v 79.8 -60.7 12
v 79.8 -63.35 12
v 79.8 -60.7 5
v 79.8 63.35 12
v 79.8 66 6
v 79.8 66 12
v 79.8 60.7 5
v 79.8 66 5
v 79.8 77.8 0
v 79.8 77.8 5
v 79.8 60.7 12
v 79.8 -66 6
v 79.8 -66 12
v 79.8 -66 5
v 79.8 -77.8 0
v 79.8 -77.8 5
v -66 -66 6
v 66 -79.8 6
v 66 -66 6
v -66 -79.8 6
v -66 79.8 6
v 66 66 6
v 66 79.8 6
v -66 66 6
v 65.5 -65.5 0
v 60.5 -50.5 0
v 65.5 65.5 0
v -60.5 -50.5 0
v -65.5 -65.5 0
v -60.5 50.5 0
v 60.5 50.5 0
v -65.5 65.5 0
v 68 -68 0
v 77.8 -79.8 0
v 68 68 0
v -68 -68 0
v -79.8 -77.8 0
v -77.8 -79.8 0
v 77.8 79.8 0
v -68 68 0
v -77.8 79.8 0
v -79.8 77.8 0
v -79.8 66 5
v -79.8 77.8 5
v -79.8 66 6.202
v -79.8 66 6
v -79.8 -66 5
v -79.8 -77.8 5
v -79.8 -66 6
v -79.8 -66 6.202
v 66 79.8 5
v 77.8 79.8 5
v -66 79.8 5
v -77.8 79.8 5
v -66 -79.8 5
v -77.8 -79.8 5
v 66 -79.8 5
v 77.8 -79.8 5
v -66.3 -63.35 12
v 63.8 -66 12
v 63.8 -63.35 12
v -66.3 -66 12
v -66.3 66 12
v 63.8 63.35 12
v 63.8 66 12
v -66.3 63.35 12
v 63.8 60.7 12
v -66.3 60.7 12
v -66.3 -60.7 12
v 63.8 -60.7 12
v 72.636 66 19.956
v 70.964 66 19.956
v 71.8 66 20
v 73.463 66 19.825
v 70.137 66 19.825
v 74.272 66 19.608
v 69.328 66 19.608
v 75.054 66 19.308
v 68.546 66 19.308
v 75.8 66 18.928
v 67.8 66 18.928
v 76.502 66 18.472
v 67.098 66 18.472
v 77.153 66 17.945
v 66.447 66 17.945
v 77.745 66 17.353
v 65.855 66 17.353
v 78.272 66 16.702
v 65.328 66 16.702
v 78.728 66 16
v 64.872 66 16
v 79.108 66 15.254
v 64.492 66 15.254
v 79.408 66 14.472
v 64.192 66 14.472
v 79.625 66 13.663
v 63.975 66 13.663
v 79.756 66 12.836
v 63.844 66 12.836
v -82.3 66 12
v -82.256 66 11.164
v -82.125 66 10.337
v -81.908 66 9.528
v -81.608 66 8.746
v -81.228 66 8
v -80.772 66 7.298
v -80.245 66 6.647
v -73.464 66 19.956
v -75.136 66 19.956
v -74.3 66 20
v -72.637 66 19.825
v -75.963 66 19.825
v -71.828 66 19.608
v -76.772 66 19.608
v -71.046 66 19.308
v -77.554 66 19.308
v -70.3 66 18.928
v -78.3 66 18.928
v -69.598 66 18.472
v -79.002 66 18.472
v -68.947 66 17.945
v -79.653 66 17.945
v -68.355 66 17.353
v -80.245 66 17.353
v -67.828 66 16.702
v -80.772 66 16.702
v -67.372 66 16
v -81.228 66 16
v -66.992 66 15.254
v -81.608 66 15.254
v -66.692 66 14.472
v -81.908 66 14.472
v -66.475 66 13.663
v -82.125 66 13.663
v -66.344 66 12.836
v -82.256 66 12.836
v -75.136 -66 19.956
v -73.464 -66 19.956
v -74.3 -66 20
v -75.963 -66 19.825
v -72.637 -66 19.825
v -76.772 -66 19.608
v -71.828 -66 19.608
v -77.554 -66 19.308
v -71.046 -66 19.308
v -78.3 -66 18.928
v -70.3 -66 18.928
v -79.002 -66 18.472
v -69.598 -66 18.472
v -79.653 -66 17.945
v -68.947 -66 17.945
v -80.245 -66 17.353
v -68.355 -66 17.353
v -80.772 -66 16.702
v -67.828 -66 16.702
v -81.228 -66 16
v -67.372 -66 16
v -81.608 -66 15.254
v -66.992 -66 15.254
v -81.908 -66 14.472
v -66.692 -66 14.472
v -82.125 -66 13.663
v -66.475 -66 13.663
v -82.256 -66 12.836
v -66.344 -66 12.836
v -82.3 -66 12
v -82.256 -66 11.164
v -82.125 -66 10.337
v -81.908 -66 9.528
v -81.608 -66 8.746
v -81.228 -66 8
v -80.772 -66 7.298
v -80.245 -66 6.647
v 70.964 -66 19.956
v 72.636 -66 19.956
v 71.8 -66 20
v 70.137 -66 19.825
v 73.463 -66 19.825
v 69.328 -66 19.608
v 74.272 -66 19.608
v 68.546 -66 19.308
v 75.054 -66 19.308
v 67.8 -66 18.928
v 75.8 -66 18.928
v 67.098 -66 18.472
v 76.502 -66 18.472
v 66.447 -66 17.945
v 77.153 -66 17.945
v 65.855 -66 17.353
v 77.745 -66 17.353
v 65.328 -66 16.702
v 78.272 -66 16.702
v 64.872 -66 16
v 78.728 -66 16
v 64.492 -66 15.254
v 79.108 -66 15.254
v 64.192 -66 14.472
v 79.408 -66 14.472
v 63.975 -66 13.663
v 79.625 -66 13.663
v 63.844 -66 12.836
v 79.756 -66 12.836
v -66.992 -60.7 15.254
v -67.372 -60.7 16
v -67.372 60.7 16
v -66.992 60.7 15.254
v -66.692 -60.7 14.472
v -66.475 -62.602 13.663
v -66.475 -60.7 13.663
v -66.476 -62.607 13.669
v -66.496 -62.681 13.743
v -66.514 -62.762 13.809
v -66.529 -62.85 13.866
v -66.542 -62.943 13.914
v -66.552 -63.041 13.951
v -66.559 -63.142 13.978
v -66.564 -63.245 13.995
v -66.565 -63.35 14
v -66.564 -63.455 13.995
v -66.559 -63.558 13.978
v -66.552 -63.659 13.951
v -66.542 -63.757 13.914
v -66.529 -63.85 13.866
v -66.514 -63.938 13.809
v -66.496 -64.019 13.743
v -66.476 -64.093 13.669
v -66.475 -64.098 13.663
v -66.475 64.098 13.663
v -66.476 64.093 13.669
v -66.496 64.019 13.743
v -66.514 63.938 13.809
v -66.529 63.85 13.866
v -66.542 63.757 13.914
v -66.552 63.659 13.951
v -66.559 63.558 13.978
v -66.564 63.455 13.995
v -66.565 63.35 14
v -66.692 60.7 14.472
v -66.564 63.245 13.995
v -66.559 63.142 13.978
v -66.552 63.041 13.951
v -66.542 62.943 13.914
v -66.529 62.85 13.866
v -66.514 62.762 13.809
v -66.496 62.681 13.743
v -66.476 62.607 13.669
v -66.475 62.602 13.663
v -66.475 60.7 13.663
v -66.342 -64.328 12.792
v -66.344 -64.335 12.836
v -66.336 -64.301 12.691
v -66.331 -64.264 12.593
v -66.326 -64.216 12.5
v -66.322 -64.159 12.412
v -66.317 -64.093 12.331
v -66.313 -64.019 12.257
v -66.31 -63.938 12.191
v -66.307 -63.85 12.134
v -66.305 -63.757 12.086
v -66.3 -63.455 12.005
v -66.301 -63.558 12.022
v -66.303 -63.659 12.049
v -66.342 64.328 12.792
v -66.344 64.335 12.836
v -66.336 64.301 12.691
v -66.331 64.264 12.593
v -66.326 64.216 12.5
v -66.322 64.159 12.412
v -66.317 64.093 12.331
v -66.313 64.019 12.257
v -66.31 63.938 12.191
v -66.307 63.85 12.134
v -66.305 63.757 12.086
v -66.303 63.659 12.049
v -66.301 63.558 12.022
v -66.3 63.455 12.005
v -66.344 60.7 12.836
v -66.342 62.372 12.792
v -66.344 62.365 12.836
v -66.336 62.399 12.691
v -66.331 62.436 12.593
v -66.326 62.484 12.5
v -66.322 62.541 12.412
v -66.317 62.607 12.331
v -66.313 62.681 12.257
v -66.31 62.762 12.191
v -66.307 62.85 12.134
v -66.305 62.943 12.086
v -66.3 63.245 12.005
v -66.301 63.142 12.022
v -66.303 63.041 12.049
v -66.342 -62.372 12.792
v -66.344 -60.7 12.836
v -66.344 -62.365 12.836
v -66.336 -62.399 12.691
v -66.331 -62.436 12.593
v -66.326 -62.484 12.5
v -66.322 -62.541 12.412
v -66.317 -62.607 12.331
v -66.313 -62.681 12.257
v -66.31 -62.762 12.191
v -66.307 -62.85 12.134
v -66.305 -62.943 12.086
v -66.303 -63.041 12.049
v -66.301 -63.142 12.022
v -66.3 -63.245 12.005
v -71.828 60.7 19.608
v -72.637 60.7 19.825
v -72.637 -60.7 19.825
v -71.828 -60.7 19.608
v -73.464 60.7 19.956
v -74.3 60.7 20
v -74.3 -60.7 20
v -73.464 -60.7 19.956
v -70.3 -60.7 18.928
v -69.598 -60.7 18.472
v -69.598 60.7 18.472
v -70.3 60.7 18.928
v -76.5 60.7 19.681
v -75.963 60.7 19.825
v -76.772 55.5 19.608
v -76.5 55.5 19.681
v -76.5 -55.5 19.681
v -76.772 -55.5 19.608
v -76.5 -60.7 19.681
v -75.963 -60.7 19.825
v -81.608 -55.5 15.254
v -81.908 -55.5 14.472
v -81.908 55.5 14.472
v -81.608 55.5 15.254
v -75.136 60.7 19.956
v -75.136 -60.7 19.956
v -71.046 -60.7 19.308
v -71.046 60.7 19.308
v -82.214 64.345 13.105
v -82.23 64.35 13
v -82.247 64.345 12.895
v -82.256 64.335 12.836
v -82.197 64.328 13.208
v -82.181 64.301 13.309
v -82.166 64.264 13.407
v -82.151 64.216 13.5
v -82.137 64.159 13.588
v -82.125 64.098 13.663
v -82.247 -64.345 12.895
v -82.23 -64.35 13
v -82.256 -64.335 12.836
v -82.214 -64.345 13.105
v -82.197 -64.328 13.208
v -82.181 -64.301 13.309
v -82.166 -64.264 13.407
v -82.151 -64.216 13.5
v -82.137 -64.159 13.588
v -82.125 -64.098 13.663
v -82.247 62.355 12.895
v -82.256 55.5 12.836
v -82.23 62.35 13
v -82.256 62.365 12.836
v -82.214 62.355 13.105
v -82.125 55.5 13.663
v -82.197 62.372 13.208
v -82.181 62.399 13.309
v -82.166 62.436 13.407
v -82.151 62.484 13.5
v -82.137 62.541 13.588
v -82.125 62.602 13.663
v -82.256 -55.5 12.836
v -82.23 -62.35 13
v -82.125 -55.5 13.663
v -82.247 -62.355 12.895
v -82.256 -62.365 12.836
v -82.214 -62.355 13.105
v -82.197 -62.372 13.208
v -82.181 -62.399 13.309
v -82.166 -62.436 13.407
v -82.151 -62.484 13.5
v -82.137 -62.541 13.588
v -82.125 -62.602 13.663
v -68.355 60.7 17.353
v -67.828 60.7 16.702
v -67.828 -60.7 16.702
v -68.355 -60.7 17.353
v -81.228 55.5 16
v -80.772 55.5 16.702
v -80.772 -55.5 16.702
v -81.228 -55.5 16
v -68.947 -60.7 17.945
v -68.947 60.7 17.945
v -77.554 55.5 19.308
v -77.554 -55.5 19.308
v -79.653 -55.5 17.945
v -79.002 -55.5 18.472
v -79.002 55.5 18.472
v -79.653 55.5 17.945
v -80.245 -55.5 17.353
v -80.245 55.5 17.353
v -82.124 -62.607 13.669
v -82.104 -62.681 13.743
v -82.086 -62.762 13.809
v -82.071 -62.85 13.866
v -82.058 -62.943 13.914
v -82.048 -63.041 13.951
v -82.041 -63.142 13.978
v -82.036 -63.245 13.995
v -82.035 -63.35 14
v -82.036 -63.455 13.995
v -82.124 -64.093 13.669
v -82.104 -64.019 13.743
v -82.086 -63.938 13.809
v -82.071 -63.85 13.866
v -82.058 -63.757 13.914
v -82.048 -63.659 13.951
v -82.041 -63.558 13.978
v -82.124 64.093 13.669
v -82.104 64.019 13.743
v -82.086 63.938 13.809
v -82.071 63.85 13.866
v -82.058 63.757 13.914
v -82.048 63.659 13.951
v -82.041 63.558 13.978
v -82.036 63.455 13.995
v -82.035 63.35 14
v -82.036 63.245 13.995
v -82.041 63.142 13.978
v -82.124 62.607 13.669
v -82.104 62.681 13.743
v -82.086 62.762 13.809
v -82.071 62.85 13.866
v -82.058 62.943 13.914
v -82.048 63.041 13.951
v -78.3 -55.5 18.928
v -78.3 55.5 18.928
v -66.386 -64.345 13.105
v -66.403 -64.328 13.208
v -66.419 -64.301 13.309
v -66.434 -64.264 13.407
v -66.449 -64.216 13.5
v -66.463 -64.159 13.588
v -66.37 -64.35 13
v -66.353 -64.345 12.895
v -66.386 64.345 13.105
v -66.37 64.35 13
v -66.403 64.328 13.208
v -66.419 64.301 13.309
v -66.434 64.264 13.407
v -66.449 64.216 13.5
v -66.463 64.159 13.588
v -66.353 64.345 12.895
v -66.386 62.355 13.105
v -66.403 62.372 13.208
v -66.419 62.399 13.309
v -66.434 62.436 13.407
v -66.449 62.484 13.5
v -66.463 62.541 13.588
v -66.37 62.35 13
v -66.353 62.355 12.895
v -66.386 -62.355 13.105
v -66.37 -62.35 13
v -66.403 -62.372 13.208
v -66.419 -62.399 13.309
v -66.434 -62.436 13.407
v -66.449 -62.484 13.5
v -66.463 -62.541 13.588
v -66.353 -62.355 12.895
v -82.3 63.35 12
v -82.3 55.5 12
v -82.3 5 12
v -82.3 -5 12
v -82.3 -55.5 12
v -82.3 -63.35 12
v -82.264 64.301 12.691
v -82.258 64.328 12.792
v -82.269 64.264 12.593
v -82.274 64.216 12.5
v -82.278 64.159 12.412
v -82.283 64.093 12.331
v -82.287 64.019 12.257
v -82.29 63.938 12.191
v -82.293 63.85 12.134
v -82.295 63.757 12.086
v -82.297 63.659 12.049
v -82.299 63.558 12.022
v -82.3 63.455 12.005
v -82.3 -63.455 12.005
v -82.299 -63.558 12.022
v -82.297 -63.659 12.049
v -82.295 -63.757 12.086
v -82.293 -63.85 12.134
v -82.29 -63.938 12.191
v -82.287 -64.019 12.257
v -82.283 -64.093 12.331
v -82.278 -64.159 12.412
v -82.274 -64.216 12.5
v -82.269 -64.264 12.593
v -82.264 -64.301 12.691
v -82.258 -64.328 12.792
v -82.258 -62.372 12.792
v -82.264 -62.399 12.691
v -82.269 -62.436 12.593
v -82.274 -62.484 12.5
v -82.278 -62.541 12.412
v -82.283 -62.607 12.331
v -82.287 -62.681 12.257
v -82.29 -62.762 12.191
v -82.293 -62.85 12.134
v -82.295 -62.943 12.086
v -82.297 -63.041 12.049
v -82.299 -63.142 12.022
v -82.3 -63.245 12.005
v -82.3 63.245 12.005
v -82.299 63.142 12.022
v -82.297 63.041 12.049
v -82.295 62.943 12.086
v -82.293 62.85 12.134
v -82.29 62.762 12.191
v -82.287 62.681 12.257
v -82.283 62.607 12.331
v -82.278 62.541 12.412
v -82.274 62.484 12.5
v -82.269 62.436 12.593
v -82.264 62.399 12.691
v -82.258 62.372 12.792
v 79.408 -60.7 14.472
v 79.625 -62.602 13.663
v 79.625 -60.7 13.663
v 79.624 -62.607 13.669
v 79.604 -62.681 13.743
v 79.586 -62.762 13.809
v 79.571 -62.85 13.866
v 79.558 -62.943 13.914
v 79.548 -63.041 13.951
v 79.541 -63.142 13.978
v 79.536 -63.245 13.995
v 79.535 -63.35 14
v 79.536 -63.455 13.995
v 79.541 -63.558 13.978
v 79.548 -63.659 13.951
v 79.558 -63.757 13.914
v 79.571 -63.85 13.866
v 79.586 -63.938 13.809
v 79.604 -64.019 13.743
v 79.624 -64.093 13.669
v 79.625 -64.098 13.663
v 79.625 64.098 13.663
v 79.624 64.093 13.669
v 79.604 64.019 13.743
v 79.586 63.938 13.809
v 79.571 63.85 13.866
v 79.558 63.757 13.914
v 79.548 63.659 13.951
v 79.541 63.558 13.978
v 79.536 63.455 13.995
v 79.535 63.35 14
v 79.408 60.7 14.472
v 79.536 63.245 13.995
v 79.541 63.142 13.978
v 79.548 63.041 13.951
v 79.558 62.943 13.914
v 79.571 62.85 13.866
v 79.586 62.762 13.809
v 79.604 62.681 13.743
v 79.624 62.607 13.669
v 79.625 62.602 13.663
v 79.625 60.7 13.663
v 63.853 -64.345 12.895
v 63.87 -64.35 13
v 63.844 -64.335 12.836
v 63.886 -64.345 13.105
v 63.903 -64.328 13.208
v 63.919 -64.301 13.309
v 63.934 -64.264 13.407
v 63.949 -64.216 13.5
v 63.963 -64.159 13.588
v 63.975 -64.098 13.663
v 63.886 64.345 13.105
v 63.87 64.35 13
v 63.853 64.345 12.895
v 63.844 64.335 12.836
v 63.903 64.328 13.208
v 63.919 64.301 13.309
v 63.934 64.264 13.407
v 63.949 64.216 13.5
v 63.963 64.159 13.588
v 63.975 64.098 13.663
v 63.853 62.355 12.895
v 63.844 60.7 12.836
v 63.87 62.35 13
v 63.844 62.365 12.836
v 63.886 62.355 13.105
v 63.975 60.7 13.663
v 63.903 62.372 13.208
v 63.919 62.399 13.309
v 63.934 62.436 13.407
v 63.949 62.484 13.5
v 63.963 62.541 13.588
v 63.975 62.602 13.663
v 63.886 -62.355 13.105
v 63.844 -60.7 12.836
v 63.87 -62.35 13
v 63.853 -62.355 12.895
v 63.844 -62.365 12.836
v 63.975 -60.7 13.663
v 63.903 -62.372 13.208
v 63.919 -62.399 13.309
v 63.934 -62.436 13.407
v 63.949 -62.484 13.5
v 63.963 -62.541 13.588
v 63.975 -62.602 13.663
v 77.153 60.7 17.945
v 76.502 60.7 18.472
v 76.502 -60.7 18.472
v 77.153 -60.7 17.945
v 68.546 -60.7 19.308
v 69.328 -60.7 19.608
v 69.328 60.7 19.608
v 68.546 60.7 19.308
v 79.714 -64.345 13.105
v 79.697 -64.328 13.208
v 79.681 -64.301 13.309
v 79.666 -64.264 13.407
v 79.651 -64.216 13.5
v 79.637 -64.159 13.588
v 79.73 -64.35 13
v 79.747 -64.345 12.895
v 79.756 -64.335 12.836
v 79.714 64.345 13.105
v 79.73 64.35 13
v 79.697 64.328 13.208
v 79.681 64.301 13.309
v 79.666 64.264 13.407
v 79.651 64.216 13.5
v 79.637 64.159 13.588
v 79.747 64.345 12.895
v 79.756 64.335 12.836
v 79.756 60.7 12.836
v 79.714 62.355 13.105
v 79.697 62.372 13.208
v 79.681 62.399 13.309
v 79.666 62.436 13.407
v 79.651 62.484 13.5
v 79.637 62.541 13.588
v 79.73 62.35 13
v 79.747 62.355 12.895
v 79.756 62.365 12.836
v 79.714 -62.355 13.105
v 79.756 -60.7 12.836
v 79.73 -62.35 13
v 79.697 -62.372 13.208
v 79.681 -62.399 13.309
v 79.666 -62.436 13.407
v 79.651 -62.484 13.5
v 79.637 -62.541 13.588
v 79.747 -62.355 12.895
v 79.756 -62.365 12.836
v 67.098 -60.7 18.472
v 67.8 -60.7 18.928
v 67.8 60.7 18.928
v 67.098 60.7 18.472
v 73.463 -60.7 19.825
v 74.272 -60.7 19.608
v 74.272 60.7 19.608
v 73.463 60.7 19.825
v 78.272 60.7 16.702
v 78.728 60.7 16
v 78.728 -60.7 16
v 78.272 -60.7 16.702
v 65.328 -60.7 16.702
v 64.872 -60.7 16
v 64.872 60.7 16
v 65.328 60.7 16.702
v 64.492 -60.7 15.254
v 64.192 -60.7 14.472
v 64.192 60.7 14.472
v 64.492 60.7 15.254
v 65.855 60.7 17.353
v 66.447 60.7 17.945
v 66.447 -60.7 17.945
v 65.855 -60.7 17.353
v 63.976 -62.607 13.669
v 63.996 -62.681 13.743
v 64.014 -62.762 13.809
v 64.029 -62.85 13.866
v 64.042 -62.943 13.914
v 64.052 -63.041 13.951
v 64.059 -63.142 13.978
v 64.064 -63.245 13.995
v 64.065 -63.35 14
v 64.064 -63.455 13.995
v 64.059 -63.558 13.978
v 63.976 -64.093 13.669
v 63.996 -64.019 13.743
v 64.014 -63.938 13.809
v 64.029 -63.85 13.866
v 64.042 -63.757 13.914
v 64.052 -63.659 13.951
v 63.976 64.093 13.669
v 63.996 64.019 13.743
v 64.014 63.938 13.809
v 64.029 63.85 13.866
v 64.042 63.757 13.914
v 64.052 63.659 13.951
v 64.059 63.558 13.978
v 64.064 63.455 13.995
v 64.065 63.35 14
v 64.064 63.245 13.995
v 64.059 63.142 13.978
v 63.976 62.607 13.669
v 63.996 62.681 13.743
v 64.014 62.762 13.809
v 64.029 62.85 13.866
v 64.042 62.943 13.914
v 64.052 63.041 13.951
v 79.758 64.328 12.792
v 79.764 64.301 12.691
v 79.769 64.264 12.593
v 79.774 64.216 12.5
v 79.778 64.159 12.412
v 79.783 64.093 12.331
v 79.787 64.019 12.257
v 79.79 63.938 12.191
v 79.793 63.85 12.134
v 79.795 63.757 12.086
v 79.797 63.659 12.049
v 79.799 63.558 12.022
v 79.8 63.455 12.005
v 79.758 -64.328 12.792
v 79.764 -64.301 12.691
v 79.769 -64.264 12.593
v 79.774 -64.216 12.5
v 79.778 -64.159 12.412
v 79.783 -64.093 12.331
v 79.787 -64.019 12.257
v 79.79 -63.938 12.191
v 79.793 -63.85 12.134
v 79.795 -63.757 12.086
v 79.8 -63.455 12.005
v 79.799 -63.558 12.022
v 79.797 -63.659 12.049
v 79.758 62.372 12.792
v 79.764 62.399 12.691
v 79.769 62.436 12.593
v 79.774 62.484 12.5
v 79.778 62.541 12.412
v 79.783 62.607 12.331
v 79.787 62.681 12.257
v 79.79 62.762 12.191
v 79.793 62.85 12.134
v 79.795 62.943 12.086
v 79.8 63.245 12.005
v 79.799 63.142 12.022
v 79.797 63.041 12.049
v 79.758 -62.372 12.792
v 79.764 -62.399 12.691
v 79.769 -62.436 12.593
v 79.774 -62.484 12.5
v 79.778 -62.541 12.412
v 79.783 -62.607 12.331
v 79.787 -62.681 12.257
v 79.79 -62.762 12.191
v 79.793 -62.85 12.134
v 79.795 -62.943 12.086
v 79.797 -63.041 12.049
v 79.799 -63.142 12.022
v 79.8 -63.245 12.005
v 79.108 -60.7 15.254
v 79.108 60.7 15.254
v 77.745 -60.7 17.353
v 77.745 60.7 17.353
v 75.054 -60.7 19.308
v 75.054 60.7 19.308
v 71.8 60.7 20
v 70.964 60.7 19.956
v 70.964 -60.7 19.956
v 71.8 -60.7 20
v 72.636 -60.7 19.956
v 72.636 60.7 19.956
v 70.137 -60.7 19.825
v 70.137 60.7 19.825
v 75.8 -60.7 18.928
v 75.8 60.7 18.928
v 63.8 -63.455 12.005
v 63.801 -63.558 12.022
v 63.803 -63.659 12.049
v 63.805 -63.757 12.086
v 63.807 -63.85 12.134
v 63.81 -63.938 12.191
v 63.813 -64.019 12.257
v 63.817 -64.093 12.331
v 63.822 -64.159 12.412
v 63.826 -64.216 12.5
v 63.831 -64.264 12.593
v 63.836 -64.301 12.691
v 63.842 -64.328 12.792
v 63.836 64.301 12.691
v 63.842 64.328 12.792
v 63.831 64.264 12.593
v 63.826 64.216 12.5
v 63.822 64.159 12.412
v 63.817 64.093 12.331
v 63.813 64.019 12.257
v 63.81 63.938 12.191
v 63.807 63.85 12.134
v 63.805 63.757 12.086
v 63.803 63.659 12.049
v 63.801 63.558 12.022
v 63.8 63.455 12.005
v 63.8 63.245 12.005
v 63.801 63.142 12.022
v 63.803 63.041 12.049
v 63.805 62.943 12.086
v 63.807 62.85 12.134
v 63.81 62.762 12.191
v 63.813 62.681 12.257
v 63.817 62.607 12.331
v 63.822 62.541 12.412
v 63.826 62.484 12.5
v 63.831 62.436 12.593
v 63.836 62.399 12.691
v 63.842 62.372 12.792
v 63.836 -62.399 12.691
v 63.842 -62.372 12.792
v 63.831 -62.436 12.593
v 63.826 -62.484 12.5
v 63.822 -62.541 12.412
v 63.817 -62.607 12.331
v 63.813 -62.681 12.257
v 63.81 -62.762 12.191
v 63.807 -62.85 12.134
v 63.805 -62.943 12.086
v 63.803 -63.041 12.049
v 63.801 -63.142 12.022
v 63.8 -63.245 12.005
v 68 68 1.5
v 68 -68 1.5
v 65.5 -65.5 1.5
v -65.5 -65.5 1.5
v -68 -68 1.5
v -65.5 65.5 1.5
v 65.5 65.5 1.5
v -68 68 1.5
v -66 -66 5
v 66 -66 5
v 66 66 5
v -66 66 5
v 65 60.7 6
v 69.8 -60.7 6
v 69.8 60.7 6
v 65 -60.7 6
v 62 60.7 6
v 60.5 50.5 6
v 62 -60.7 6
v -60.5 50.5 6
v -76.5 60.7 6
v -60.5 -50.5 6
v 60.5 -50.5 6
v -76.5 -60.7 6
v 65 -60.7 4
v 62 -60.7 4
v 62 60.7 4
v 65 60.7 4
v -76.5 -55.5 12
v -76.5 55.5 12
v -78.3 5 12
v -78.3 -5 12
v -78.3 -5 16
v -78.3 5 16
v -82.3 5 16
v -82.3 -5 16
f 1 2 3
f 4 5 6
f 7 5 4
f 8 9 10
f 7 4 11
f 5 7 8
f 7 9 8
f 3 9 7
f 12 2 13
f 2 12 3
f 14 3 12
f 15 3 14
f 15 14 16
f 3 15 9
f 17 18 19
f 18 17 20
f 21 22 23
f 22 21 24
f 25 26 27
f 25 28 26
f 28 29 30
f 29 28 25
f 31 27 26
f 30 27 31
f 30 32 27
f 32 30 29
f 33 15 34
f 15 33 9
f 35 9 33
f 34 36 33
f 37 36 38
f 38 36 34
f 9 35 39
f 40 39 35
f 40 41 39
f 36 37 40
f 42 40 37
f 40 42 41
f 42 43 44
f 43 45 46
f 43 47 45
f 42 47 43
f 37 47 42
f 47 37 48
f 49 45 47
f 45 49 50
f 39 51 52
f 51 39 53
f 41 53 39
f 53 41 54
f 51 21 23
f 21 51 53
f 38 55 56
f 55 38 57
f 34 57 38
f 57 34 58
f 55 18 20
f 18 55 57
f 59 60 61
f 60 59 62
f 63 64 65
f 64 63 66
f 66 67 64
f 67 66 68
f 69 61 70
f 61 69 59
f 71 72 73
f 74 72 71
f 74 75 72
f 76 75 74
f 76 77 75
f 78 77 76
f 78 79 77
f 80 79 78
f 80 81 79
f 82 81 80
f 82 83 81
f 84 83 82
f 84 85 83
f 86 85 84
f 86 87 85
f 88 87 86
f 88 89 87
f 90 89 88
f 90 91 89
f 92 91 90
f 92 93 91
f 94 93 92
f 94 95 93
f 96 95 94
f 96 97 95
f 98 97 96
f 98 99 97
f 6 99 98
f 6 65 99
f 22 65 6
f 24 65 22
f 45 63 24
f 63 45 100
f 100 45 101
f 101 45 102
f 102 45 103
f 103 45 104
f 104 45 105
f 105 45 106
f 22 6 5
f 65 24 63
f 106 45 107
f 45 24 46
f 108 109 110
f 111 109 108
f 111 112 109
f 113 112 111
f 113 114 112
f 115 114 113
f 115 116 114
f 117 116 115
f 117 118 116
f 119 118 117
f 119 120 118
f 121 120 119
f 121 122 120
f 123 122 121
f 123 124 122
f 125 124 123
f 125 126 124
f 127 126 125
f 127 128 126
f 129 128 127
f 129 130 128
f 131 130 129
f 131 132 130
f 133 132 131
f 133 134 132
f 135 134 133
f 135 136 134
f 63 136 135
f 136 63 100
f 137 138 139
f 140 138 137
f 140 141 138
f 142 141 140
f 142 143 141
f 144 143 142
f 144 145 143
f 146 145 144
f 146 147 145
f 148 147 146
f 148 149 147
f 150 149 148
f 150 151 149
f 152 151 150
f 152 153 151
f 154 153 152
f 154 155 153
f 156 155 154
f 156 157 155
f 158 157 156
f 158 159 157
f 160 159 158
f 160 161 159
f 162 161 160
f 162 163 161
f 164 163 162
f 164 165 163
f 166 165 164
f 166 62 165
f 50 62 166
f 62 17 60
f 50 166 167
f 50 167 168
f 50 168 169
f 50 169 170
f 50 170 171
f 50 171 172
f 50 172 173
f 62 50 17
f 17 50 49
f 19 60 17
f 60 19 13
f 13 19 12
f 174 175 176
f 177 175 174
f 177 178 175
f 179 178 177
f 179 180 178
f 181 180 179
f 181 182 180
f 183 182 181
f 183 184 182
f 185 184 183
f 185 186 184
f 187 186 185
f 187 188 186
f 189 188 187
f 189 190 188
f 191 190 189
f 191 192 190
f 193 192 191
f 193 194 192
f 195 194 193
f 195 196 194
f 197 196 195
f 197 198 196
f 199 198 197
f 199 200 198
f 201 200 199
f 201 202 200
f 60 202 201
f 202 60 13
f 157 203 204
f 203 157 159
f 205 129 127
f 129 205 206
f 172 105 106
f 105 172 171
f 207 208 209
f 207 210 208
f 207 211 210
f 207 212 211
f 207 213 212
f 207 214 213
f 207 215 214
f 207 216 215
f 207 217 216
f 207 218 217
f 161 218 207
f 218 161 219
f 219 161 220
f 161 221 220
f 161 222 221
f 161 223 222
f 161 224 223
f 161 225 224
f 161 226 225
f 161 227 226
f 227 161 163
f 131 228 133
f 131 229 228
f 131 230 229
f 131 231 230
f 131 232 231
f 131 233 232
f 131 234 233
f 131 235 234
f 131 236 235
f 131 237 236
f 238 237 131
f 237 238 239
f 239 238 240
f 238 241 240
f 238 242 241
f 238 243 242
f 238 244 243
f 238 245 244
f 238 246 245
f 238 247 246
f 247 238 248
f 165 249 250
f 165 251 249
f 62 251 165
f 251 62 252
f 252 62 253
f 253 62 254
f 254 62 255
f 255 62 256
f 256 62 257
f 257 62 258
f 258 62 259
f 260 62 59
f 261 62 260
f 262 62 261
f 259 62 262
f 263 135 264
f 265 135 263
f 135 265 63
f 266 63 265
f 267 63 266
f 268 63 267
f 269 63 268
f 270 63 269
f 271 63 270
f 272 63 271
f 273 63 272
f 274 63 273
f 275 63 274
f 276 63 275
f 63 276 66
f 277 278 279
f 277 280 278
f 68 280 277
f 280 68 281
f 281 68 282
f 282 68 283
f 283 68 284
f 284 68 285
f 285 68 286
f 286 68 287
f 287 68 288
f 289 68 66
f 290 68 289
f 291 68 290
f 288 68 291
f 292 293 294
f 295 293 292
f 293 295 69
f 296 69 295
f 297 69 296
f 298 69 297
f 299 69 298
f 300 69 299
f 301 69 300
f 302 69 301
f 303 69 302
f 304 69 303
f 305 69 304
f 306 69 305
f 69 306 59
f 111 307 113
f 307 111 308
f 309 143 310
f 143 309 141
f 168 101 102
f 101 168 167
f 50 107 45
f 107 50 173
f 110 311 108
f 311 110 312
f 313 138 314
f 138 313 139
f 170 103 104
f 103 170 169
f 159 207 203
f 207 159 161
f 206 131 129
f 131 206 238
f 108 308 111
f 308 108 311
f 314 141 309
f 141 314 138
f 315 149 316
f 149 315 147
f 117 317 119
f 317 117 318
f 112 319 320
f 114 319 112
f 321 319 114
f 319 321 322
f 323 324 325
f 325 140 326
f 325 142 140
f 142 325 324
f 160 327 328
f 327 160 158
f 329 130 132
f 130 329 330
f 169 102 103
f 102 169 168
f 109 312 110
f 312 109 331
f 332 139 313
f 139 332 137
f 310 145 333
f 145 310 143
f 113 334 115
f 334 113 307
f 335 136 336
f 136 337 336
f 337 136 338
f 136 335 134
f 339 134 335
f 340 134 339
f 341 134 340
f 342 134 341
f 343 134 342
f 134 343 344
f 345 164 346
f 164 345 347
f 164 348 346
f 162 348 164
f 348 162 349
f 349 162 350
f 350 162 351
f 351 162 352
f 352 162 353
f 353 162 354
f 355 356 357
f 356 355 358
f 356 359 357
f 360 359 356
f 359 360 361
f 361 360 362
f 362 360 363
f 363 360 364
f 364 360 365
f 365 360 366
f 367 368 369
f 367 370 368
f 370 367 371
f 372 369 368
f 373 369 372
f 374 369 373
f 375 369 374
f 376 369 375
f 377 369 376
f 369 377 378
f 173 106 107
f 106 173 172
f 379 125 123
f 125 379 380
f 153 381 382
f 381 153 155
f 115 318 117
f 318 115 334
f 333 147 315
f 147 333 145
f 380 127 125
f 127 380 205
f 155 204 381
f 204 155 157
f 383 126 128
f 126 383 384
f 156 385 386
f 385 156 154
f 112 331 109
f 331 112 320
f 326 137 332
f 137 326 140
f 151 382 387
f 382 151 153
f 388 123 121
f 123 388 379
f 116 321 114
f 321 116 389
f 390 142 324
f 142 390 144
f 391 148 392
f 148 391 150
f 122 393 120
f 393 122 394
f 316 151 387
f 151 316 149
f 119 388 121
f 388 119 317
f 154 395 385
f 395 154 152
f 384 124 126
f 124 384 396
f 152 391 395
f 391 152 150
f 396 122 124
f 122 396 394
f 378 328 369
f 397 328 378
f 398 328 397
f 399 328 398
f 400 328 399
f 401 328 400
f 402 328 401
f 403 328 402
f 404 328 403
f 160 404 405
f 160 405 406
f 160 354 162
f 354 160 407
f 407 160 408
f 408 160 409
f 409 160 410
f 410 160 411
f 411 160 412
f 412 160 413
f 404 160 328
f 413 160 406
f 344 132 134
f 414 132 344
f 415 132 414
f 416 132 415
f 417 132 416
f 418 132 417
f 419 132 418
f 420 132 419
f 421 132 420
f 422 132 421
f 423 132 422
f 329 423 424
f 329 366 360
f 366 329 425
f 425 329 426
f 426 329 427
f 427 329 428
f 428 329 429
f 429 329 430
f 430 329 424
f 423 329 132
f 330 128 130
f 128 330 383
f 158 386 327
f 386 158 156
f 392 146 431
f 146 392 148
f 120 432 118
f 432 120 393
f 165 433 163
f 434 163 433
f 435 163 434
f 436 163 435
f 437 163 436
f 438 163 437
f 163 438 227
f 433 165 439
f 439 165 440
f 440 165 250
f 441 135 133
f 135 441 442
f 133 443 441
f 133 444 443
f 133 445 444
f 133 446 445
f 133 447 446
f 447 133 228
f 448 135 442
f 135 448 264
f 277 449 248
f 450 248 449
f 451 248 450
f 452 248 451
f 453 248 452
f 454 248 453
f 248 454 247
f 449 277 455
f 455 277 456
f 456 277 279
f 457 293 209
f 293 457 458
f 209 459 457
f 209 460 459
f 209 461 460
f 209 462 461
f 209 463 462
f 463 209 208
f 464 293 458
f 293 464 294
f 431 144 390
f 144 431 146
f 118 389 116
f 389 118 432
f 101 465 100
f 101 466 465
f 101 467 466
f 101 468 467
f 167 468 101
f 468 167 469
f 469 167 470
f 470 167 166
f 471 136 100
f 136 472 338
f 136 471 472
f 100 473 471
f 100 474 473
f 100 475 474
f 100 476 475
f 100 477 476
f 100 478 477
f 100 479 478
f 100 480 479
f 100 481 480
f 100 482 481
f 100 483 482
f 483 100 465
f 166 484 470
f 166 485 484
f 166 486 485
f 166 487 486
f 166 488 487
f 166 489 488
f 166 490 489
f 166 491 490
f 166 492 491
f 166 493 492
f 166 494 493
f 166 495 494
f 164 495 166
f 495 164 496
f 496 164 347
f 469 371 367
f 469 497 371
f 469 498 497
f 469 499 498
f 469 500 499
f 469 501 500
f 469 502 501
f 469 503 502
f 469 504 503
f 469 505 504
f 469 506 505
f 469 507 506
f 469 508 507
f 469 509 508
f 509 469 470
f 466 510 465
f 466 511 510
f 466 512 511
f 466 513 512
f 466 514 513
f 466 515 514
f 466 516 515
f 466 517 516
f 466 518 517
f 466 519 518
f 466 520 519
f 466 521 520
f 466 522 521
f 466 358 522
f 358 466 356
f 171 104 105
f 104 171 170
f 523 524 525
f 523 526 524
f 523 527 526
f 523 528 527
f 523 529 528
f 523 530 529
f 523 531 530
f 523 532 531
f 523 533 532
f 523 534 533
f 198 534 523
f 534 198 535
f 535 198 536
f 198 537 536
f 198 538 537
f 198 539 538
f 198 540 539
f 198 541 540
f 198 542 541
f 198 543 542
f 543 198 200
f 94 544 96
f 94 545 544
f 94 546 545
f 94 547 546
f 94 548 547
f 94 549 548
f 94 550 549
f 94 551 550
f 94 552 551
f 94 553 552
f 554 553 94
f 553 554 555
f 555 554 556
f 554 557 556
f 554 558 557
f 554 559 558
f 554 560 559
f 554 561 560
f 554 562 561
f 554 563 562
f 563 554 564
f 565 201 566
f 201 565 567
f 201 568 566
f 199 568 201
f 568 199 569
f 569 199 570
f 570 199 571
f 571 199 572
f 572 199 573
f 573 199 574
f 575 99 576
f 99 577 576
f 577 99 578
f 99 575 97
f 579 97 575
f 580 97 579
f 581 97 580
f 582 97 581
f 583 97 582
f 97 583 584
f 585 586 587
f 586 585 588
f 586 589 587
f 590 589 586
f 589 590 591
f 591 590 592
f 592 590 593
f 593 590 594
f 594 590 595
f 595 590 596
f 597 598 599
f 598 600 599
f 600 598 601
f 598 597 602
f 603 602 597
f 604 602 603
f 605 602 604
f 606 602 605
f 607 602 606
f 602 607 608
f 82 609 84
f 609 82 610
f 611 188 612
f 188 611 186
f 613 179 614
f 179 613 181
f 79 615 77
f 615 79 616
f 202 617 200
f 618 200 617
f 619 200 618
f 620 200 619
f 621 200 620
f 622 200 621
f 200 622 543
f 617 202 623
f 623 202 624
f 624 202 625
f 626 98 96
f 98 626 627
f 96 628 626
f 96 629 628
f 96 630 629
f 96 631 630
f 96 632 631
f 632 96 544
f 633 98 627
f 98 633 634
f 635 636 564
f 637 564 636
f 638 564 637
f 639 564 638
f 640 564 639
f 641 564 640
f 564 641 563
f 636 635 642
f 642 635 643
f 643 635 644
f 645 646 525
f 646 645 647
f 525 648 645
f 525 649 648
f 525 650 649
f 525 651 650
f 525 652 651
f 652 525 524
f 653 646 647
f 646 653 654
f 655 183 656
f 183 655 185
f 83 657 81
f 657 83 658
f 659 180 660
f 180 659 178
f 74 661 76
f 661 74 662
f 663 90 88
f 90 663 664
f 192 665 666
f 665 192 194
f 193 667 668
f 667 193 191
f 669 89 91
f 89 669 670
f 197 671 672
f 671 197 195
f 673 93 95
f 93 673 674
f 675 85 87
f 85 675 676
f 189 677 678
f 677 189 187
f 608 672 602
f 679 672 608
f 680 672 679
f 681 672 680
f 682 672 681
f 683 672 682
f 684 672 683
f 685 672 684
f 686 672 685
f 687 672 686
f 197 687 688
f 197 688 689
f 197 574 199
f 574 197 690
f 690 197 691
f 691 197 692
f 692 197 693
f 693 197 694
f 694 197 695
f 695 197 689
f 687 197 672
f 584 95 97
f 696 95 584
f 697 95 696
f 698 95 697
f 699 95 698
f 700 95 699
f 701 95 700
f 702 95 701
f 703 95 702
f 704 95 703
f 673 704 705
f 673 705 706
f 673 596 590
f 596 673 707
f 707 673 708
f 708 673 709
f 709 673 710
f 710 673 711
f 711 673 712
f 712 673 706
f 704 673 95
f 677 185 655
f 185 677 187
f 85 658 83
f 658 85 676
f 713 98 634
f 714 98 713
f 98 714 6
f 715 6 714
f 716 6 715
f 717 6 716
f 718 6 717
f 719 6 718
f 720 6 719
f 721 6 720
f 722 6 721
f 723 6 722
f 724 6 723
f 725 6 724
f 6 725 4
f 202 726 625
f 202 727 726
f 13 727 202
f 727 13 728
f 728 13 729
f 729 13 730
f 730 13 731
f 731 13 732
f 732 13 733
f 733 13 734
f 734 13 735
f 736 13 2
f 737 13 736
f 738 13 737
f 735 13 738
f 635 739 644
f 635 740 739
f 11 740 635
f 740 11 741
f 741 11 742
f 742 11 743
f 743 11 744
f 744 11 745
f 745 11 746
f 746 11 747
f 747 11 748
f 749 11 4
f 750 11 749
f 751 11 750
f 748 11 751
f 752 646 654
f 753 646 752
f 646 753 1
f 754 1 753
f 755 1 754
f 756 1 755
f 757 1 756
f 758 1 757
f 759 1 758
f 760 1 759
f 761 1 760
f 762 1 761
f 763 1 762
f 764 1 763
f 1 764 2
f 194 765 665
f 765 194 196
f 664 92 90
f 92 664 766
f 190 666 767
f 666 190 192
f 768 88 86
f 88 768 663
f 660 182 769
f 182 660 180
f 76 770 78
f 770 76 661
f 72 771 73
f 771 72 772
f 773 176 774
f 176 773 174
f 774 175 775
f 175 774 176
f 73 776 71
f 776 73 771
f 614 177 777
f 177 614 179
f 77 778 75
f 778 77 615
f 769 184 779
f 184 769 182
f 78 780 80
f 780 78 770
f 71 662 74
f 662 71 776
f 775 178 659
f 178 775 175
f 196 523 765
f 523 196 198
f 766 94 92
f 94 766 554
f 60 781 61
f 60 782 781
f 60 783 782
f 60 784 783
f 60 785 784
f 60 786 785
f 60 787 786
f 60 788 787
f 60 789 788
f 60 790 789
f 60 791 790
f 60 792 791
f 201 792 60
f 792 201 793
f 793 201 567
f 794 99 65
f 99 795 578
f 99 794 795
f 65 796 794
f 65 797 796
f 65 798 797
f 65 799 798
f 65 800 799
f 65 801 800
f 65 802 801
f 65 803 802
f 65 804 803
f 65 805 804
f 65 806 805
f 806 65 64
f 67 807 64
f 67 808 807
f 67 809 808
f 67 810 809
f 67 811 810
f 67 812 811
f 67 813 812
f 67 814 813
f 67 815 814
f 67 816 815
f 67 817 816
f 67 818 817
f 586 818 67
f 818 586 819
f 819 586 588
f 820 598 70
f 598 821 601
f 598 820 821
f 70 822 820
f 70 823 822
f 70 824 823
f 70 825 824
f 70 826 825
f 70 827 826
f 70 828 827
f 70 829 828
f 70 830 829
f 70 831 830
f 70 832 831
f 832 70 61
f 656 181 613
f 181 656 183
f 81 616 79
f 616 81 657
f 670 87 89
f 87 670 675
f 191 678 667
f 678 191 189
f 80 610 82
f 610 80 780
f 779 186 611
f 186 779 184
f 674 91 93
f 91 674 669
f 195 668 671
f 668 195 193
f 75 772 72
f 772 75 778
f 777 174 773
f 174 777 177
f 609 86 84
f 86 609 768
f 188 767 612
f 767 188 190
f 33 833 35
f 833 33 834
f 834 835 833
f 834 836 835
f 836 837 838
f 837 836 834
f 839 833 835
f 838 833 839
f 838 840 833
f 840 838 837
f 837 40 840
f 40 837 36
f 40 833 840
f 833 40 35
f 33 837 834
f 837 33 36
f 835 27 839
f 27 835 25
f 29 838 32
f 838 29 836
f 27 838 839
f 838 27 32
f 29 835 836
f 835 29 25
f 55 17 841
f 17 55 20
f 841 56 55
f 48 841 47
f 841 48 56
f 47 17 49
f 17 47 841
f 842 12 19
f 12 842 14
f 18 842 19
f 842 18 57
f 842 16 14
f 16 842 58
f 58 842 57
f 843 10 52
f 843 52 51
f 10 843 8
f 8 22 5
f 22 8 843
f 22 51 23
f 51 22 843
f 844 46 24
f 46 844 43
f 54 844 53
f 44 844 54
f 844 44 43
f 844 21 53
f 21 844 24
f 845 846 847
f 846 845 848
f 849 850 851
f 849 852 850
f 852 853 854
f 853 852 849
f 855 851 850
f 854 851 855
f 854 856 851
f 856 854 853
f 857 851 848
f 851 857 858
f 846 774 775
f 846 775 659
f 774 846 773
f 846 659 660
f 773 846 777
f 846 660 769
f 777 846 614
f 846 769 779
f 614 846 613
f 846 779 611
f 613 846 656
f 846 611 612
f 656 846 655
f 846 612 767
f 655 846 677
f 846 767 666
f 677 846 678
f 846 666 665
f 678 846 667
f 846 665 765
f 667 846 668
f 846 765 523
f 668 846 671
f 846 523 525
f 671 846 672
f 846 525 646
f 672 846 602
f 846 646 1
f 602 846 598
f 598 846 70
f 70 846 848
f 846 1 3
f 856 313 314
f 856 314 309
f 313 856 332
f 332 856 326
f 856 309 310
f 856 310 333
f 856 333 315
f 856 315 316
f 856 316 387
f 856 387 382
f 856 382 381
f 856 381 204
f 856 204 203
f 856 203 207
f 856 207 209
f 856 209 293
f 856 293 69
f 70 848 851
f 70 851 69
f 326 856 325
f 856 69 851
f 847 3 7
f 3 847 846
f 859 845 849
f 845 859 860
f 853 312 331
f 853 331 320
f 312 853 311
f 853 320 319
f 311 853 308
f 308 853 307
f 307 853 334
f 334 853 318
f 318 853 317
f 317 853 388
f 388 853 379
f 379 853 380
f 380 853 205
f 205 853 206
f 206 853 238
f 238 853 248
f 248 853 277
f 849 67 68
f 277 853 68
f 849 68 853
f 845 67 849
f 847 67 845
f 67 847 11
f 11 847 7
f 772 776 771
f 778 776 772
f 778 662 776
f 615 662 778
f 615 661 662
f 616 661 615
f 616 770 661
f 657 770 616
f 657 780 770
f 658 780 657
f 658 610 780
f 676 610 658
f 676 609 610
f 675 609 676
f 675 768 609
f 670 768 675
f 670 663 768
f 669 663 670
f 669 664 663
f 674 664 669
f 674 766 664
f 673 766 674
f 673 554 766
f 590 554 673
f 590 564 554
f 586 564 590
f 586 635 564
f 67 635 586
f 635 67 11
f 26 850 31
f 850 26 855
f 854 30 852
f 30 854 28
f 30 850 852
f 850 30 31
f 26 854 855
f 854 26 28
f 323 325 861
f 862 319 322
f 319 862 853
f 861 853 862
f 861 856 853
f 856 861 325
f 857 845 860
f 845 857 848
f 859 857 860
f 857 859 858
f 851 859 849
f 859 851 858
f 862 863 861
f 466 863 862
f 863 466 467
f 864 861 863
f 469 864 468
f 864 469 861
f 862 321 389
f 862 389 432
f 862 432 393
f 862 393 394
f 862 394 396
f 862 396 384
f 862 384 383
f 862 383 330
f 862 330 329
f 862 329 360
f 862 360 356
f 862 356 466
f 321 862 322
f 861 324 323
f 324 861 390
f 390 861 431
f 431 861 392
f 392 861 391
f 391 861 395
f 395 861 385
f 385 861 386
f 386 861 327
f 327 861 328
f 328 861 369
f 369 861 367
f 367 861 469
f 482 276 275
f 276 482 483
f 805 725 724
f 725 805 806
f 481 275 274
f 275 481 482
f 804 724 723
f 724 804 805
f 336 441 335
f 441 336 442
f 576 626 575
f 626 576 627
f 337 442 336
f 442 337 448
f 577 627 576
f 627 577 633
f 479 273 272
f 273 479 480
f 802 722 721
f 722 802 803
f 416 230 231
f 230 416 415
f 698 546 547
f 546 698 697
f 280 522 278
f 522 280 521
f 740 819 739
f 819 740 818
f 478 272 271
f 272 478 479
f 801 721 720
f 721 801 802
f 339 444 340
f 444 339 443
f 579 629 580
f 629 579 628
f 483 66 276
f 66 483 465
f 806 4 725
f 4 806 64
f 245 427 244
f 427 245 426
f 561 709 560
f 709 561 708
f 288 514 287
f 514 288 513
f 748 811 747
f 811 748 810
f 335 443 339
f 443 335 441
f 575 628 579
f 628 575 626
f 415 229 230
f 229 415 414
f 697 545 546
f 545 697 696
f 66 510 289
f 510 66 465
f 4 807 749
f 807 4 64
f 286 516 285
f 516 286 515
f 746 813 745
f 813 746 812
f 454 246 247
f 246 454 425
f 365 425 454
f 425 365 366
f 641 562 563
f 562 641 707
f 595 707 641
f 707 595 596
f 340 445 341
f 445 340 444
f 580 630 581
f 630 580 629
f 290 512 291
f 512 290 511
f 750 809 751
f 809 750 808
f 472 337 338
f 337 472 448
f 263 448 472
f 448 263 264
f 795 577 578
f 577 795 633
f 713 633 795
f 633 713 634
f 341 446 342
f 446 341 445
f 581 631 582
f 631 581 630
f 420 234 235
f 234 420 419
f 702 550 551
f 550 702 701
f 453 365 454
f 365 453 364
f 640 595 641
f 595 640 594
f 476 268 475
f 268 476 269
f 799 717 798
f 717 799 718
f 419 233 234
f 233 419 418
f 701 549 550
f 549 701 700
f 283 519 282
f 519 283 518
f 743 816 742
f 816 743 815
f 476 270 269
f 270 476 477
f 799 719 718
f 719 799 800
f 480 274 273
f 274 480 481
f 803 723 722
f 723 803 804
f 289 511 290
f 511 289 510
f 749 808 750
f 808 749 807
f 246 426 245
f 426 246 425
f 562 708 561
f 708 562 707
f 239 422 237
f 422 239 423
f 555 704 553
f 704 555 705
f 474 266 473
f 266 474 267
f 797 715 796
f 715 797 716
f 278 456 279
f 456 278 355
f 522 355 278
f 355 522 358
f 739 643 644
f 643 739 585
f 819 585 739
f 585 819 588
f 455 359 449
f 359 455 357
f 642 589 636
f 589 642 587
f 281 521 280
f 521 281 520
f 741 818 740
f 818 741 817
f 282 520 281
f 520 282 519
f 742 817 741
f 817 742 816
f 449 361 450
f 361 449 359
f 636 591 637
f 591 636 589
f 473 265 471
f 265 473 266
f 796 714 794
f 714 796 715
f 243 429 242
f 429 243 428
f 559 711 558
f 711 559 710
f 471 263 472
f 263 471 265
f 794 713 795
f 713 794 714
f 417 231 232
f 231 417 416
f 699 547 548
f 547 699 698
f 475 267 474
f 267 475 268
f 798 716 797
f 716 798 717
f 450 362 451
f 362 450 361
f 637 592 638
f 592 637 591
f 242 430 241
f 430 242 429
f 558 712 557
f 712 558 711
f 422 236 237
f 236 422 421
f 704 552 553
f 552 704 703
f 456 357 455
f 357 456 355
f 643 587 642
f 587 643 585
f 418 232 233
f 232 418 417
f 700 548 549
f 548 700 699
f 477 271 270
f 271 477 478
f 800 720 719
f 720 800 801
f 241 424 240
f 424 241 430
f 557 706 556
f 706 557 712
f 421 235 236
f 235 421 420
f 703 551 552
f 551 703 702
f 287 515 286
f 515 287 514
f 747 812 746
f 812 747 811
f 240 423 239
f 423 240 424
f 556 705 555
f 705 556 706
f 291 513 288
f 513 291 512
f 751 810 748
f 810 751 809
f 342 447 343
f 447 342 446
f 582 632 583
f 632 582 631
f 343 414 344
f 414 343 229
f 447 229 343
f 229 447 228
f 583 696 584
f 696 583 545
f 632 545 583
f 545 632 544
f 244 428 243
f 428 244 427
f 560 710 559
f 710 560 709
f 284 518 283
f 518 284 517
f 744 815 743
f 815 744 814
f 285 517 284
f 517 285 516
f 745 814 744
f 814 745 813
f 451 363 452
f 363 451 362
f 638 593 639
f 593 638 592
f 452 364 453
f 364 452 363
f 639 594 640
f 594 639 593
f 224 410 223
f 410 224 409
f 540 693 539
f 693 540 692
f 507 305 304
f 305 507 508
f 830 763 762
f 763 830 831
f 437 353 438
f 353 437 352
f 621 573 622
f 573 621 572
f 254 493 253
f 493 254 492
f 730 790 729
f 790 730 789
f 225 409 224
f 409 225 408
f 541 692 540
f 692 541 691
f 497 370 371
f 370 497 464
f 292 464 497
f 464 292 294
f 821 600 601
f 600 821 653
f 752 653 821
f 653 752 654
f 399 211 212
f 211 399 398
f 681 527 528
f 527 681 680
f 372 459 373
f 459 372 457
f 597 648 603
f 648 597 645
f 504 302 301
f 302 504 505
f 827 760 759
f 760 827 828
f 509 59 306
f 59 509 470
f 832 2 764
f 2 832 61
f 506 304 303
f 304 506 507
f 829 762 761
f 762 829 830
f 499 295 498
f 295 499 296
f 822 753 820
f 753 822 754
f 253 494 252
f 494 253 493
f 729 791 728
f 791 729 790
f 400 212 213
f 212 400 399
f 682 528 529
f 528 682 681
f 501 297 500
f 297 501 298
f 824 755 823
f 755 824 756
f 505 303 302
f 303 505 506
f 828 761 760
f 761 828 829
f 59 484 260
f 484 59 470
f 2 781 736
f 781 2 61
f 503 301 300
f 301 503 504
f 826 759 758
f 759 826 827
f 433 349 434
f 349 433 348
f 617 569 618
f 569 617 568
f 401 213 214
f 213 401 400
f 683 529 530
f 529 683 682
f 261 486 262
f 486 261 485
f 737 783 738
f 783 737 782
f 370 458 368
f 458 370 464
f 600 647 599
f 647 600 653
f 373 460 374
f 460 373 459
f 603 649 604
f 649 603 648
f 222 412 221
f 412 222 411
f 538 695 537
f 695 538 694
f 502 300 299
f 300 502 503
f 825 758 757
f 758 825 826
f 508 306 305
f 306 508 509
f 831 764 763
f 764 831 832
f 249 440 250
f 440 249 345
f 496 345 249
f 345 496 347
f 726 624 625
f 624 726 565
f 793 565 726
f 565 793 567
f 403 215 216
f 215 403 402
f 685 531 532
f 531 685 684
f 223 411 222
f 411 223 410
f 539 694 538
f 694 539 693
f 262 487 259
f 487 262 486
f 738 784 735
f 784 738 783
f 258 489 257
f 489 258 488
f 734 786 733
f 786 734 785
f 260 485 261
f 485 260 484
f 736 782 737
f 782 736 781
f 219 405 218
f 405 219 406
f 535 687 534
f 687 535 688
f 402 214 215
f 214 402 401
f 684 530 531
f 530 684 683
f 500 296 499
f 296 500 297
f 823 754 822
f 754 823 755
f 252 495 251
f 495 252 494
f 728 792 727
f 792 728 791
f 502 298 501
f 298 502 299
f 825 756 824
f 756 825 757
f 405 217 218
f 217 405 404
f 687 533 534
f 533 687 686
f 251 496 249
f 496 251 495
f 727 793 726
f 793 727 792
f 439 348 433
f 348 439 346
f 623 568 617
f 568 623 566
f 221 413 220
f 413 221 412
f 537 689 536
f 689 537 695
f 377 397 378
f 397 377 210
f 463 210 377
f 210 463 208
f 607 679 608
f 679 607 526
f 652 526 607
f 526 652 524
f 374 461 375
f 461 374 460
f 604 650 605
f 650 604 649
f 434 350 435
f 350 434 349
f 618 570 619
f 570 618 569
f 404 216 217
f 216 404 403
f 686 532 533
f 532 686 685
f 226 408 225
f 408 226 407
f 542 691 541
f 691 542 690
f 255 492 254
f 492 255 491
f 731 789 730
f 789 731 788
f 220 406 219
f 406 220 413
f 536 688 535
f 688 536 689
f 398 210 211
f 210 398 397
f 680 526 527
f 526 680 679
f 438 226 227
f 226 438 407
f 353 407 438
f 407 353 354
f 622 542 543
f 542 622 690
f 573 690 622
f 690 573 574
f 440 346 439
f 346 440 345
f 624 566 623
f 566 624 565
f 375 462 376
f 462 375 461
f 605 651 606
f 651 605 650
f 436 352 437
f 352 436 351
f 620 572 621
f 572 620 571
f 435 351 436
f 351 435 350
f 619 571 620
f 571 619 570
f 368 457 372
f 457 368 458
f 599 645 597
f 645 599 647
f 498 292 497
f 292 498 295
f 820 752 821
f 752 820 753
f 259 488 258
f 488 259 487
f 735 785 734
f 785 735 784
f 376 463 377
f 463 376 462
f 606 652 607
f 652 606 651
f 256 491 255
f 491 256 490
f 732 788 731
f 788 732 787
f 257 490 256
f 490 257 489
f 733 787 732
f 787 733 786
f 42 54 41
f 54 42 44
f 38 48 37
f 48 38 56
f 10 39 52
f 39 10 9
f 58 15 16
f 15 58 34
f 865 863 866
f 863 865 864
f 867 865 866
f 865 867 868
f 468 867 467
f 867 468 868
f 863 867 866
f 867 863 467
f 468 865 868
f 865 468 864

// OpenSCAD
// file: modules.scad
module roof(l, w, h){
    polyhedron(
        points=[
            [0,0,0],
            [l,0,0],
            [l,w,0],
            [0,w,0],
            [0,w/2,h],
            [l,w/2,h]
            ],
        faces=[
            [0,1,2,3],
            [0,4,1],
            [1,4,5,2],
            [2,5,3],
            [3,5,4,0]
            ]
            );
    };

module wedge(l, w, h) {
    polyhedron(
            points=[
                [0,0,0],
                [l,0,0],
                [l,w,0],
                [0,w,0],
                [0,0,h],
                [l,0,h]
            ],
            faces=[
                [0,3,2,1],
                [0,1,5,4],
                [1,2,5],
                [2,3,4,5],
                [3,0,4]
            ]
    );
   };    
module tube(d1, d2, h) {
    difference() {
        cylinder(d=d1, h=h);
        cylinder(d=d2, h=h);
        };
    };

module countersunk_screw(vScrew_d, vScrew_l){
    union(){
    cylinder(d=vScrew_d, h= vScrew_l);
    cylinder(d1=vScrew_d*2, h=vScrew_d);
    };
};
// main file
// some variables
$fn = 60; // we are using 60 fragments for cylinders and similar objects

// some modules such as hex, countersunk screws, roof, wedge are available in a module file
use <modules.scad>;


// variables

// this are raw measurements - we will derive the final measurements for our model from them
vBackPlateLength = 160;
vBackPlateStrength = 5;

vBellowsFrameUpperLength = 160;
vBellowsFrameLowerLength = 136;

vCassetteLength = 170 ;
vCassetteWidth = 121;
vCassetteHeight = 11;
vCassetteLowerBorder = 16;
vCassetteLighttrapBorder = 1.5;
vCassetteLighttrap = 3;
vFilmWindowLength = 121;
vFilmWindowWidth = 101;



vTolerance = 0.2;

vBackPlate_l = vBackPlateLength-(2*vTolerance);
vBackPlate_w = vBackPlate_l;
vBackPlate_h = vBackPlateStrength+1; // we add 1mm and make indents for our locks
vBackPlate_offsetX = -vBackPlate_l/2;
vBackPlate_offsetY = -vBackPlate_w/2;
vBackPlate_offsetZ = 0;

vEdgeCut = 2;
vEdgeCut_h = vBackPlate_h;
vEdgeCut_offsetX = -vBackPlate_l/2;
vEdgeCut_offsetY = -vBackPlate_w/2;
vEdgeCut_offsetZ = 0;

vLightTrapOuter_l = 136;
vLightTrapOuter_w = vLightTrapOuter_l;
vLightTrapInner_l = 131;
vLightTrapInner_w = vLightTrapInner_l;
vLightTrap_h = 1.5;
vLightTrapOuter_offsetX = -vLightTrapOuter_l/2;
vLightTrapOuter_offsetY = -vLightTrapOuter_w/2;
vLightTrapInner_offsetX = -vLightTrapInner_l/2;
vLightTrapInner_offsetY = -vLightTrapInner_w/2;
vLightTrap_offsetZ = 0;

vWindowCutout_l = vFilmWindowLength;
vWindowCutout_w = vFilmWindowWidth;
vWindowCutout_h = vBackPlate_h;
vWindowCutout_offsetX = -vWindowCutout_l/2;
vWindowCutout_offsetY = -vWindowCutout_w/2;
vWindowCutout_offsetZ = 0;

vCassetteBaseBlock_l = vBackPlate_l;
vCassetteBaseBlock_w = 132;
vCassetteBaseBlock_h = 6; // Graflok height!
vCassetteBaseBlock_offsetX = -vCassetteBaseBlock_l/2;
vCassetteBaseBlock_offsetY = -vCassetteBaseBlock_w/2;
vCassetteBaseBlock_offsetZ = vBackPlate_h;

vCassetteGuideBaseCylinder_d = 16;
vCassetteGuideBaseCylinder_h = vCassetteBaseBlock_w;
vCassetteGuideBaseCylinder_offsetX1 = -(vCassetteBaseBlock_l-vCassetteGuideBaseCylinder_d+5)/2;
vCassetteGuideBaseCylinder_offsetX2 = (vCassetteBaseBlock_l-vCassetteGuideBaseCylinder_d)/2;
vCassetteGuideBaseCylinder_offsetY = -vCassetteGuideBaseCylinder_h/2;
vCassetteGuideBaseCylinder_offsetZ = vBackPlate_h+vCassetteBaseBlock_h;

vCassetteGuideBackCutout_l = vCassetteGuideBaseCylinder_d;
vCassetteGuideBackCutout_w = vCassetteWidth-10;
vCassetteGuideBackCutout_h = vCassetteGuideBaseCylinder_d/2;
vCassetteGuideBackCutout_offsetX = -(vCassetteBaseBlock_l+vCassetteGuideBaseCylinder_d)/2;
vCassetteGuideBackCutout_offsetY = -vCassetteGuideBackCutout_w/2;
vCassetteGuideBackCutout_offsetZ = vBackPlate_h+vCassetteBaseBlock_h;


vCassetteCutout_l = vCassetteLength;
vCassetteCutout_w = vCassetteWidth+(2*vTolerance);
vCassetteCutout_h = vCassetteGuideBaseCylinder_d; // normally we would take only the cassette height, but we need a bit more height to cut out our guides from the base cylinders
vCassetteCutout_offsetX = -((vWindowCutout_l/2)+vCassetteLowerBorder);
vCassetteCutout_offsetY = -vCassetteCutout_w/2;
vCassetteCutout_offsetZ = vBackPlate_h;

vCassetteLighttrap_l = vCassetteLighttrap;
vCassetteLighttrap_w = vCassetteWidth+(2*vTolerance);
vCassetteLighttrap_h = 2;
vCassetteLighttrap_offsetX = (vWindowCutout_l/2)+vCassetteLighttrapBorder;
vCassetteLighttrap_offsetY = -vCassetteLighttrap_w/2;
vCassetteLighttrap_offsetZ = vBackPlate_h-vCassetteLighttrap_h;

vSpringHole_d = 2;
vSpringHole_h = vCassetteBaseBlock_l+vCassetteGuideBaseCylinder_d;
vSpringHole_offsetX = -vSpringHole_h/2;
vSpringHole_offsetY = ((vCassetteBaseBlock_w-vCassetteCutout_w)/4)+(vCassetteCutout_w/2);
vSpringHole_offsetZ = vBackPlate_h+vCassetteBaseBlock_h+(vSpringHole_d/2);

vSpringHolder_l = 4;
vSpringHolder_w = 10;
vSpringHolder_h = 4;
vSpringHolder_offsetX = vCassetteBaseBlock_offsetX-2.5;
vSpringHolder_offsetY = -vSpringHolder_w/2;
vSpringHolder_offsetZ = vBackPlate_h+vCassetteBaseBlock_h;

vFrontRamp_l = 10;
vFrontRamp_w = vCassetteCutout_w;
vFrontRamp_h = -(vBackPlate_h-5);
vFrontRamp_offsetX = vBackPlate_l/2;
vFrontRamp_offsetY = -vFrontRamp_w/2;
vFrontRamp_offsetZ = vBackPlate_h;

vLockPatch_l = 14-vTolerance;
vLockPatch_w = vLockPatch_l;
vLockPatch_h = vBackPlate_h-5;
vLockPatch_offsetX = -vBackPlate_l/2;
vLockPatch_offsetY = -vBackPlate_w/2;
vLockPatch_offsetZ = 5;


union(){
difference(){
    union(){
    // base plate
    translate([vBackPlate_offsetX, vBackPlate_offsetY, vBackPlate_offsetZ])
        cube([vBackPlate_l, vBackPlate_w, vBackPlate_h]);
    // cassette base block
    translate([vCassetteBaseBlock_offsetX, vCassetteBaseBlock_offsetY, vCassetteBaseBlock_offsetZ])
        cube([vCassetteBaseBlock_l, vCassetteBaseBlock_w, vCassetteBaseBlock_h]);    
    // cassette guide base cylinders
    translate([vCassetteGuideBaseCylinder_offsetX1, vCassetteGuideBaseCylinder_offsetY, vCassetteGuideBaseCylinder_offsetZ])
        rotate([270,0,0])
            cylinder(d=vCassetteGuideBaseCylinder_d, h=vCassetteGuideBaseCylinder_h);
    translate([vCassetteGuideBaseCylinder_offsetX2, vCassetteGuideBaseCylinder_offsetY, vCassetteGuideBaseCylinder_offsetZ])
        rotate([270,0,0])
            cylinder(d=vCassetteGuideBaseCylinder_d, h=vCassetteGuideBaseCylinder_h);    
        
        };
    
    // light trap
    difference(){
        translate([vLightTrapOuter_offsetX, vLightTrapOuter_offsetY, vLightTrap_offsetZ])
            cube([vLightTrapOuter_l, vLightTrapOuter_w, vLightTrap_h]);
        translate([vLightTrapInner_offsetX, vLightTrapInner_offsetY, vLightTrap_offsetZ])
            cube([vLightTrapInner_l, vLightTrapInner_w, vLightTrap_h]);
            };
    
    // front ramp
    translate([vFrontRamp_offsetX, vFrontRamp_offsetY, vFrontRamp_offsetZ])
        rotate([0, 0, 90])
            wedge(vFrontRamp_w, vFrontRamp_l, vFrontRamp_h);        
            
    // window
    translate([vWindowCutout_offsetX, vWindowCutout_offsetY, vWindowCutout_offsetZ])
        cube([vWindowCutout_l, vWindowCutout_w, vWindowCutout_h]);        
    
    // cassette cutout
    translate([vCassetteCutout_offsetX, vCassetteCutout_offsetY, vCassetteCutout_offsetZ])
        cube([vCassetteCutout_l, vCassetteCutout_w, vCassetteCutout_h]);        
            
    // cassette light trap
    translate([vCassetteLighttrap_offsetX, vCassetteLighttrap_offsetY, vCassetteLighttrap_offsetZ])
        cube([vCassetteLighttrap_l, vCassetteLighttrap_w, vCassetteLighttrap_h]);        
            
    // cassette guide back cutout
    translate([vCassetteGuideBackCutout_offsetX, vCassetteGuideBackCutout_offsetY, vCassetteGuideBackCutout_offsetZ])
        cube([vCassetteGuideBackCutout_l, vCassetteGuideBackCutout_w, vCassetteGuideBackCutout_h]);
   
    // spring holes
    // +y
    translate([vSpringHole_offsetX, vSpringHole_offsetY, vSpringHole_offsetZ])
    rotate([0, 90, 0])
    cylinder(d=vSpringHole_d, h=vSpringHole_h);
        // -y
    translate([vSpringHole_offsetX, -vSpringHole_offsetY, vSpringHole_offsetZ])
    rotate([0, 90, 0])
    cylinder(d=vSpringHole_d, h=vSpringHole_h);         
    
    // cutting the edges of the base plate
    translate([vEdgeCut_offsetX, -vEdgeCut_offsetY, vEdgeCut_offsetZ])
        rotate([0, 270, 0])
            wedge(vEdgeCut_h, -vEdgeCut, -vEdgeCut);
    translate([vEdgeCut_offsetX, vEdgeCut_offsetY, vEdgeCut_offsetZ])
        rotate([0, 270, 0])
            wedge(vEdgeCut_h, vEdgeCut, -vEdgeCut);
    translate([-vEdgeCut_offsetX, -vEdgeCut_offsetY, vEdgeCut_offsetZ])
        rotate([0, 270, 0])
            wedge(vEdgeCut_h, -vEdgeCut, vEdgeCut);
    translate([-vEdgeCut_offsetX, vEdgeCut_offsetY, vEdgeCut_offsetZ])
        rotate([0, 270, 0])
            wedge(vEdgeCut_h, vEdgeCut, vEdgeCut);
    
    // lock patches
    
    for (a =[0, 90, 180, 270]){ 
        rotate([0,0,a])
            translate([vLockPatch_offsetX, vLockPatch_offsetY, vLockPatch_offsetZ])
            cube([vLockPatch_l, vLockPatch_w, vLockPatch_h]); 
        };
    
    };
    
    // spring holder
    translate([vSpringHolder_offsetX, vSpringHolder_offsetY, vSpringHolder_offsetZ])
        cube([vSpringHolder_l, vSpringHolder_w, vSpringHolder_h]);
    
    
    
    
    
};    
 
